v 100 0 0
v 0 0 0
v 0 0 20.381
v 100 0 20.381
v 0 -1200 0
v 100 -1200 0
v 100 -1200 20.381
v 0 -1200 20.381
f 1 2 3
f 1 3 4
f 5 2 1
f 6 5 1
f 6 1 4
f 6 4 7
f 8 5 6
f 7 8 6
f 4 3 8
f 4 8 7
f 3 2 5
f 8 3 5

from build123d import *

# Parameters (mm, degrees)
F0_W     = 45.1045036316
F0_H     = 20.3813612461
F1_DEPTH = 1200
F2_DEPTH = 20
F3_DEPTH = 100
F4_DEPTH = 200


with BuildPart() as f1:
    # F0 (on Front) → F1 (new body)
    with BuildSketch(Plane.XZ):
        with Locations((22.5522518158, 10.1906806231)):
            Rectangle(F0_W, F0_H)
    extrude(amount=F1_DEPTH)

    # F2 (add): a face of the model
    f2_faces = [f1.faces().sort_by_distance(p)[0] for p in [
        (22.5522518158, -600, 0),
    ]]
    extrude(f2_faces, amount=-F2_DEPTH)

    # F3 (add): a face of the model
    f3_faces = [f1.faces().sort_by_distance(p)[0] for p in [
        (0, -600, 10.1906806231),
    ]]
    extrude(f3_faces, amount=-F3_DEPTH)

    # F4 (intersect): a face of the model
    f4_faces = [f1.faces().sort_by_distance(p)[0] for p in [
        (50, -600, 0),
    ]]
    extrude(f4_faces, amount=-F4_DEPTH, mode=Mode.INTERSECT)


solid = f1.part
